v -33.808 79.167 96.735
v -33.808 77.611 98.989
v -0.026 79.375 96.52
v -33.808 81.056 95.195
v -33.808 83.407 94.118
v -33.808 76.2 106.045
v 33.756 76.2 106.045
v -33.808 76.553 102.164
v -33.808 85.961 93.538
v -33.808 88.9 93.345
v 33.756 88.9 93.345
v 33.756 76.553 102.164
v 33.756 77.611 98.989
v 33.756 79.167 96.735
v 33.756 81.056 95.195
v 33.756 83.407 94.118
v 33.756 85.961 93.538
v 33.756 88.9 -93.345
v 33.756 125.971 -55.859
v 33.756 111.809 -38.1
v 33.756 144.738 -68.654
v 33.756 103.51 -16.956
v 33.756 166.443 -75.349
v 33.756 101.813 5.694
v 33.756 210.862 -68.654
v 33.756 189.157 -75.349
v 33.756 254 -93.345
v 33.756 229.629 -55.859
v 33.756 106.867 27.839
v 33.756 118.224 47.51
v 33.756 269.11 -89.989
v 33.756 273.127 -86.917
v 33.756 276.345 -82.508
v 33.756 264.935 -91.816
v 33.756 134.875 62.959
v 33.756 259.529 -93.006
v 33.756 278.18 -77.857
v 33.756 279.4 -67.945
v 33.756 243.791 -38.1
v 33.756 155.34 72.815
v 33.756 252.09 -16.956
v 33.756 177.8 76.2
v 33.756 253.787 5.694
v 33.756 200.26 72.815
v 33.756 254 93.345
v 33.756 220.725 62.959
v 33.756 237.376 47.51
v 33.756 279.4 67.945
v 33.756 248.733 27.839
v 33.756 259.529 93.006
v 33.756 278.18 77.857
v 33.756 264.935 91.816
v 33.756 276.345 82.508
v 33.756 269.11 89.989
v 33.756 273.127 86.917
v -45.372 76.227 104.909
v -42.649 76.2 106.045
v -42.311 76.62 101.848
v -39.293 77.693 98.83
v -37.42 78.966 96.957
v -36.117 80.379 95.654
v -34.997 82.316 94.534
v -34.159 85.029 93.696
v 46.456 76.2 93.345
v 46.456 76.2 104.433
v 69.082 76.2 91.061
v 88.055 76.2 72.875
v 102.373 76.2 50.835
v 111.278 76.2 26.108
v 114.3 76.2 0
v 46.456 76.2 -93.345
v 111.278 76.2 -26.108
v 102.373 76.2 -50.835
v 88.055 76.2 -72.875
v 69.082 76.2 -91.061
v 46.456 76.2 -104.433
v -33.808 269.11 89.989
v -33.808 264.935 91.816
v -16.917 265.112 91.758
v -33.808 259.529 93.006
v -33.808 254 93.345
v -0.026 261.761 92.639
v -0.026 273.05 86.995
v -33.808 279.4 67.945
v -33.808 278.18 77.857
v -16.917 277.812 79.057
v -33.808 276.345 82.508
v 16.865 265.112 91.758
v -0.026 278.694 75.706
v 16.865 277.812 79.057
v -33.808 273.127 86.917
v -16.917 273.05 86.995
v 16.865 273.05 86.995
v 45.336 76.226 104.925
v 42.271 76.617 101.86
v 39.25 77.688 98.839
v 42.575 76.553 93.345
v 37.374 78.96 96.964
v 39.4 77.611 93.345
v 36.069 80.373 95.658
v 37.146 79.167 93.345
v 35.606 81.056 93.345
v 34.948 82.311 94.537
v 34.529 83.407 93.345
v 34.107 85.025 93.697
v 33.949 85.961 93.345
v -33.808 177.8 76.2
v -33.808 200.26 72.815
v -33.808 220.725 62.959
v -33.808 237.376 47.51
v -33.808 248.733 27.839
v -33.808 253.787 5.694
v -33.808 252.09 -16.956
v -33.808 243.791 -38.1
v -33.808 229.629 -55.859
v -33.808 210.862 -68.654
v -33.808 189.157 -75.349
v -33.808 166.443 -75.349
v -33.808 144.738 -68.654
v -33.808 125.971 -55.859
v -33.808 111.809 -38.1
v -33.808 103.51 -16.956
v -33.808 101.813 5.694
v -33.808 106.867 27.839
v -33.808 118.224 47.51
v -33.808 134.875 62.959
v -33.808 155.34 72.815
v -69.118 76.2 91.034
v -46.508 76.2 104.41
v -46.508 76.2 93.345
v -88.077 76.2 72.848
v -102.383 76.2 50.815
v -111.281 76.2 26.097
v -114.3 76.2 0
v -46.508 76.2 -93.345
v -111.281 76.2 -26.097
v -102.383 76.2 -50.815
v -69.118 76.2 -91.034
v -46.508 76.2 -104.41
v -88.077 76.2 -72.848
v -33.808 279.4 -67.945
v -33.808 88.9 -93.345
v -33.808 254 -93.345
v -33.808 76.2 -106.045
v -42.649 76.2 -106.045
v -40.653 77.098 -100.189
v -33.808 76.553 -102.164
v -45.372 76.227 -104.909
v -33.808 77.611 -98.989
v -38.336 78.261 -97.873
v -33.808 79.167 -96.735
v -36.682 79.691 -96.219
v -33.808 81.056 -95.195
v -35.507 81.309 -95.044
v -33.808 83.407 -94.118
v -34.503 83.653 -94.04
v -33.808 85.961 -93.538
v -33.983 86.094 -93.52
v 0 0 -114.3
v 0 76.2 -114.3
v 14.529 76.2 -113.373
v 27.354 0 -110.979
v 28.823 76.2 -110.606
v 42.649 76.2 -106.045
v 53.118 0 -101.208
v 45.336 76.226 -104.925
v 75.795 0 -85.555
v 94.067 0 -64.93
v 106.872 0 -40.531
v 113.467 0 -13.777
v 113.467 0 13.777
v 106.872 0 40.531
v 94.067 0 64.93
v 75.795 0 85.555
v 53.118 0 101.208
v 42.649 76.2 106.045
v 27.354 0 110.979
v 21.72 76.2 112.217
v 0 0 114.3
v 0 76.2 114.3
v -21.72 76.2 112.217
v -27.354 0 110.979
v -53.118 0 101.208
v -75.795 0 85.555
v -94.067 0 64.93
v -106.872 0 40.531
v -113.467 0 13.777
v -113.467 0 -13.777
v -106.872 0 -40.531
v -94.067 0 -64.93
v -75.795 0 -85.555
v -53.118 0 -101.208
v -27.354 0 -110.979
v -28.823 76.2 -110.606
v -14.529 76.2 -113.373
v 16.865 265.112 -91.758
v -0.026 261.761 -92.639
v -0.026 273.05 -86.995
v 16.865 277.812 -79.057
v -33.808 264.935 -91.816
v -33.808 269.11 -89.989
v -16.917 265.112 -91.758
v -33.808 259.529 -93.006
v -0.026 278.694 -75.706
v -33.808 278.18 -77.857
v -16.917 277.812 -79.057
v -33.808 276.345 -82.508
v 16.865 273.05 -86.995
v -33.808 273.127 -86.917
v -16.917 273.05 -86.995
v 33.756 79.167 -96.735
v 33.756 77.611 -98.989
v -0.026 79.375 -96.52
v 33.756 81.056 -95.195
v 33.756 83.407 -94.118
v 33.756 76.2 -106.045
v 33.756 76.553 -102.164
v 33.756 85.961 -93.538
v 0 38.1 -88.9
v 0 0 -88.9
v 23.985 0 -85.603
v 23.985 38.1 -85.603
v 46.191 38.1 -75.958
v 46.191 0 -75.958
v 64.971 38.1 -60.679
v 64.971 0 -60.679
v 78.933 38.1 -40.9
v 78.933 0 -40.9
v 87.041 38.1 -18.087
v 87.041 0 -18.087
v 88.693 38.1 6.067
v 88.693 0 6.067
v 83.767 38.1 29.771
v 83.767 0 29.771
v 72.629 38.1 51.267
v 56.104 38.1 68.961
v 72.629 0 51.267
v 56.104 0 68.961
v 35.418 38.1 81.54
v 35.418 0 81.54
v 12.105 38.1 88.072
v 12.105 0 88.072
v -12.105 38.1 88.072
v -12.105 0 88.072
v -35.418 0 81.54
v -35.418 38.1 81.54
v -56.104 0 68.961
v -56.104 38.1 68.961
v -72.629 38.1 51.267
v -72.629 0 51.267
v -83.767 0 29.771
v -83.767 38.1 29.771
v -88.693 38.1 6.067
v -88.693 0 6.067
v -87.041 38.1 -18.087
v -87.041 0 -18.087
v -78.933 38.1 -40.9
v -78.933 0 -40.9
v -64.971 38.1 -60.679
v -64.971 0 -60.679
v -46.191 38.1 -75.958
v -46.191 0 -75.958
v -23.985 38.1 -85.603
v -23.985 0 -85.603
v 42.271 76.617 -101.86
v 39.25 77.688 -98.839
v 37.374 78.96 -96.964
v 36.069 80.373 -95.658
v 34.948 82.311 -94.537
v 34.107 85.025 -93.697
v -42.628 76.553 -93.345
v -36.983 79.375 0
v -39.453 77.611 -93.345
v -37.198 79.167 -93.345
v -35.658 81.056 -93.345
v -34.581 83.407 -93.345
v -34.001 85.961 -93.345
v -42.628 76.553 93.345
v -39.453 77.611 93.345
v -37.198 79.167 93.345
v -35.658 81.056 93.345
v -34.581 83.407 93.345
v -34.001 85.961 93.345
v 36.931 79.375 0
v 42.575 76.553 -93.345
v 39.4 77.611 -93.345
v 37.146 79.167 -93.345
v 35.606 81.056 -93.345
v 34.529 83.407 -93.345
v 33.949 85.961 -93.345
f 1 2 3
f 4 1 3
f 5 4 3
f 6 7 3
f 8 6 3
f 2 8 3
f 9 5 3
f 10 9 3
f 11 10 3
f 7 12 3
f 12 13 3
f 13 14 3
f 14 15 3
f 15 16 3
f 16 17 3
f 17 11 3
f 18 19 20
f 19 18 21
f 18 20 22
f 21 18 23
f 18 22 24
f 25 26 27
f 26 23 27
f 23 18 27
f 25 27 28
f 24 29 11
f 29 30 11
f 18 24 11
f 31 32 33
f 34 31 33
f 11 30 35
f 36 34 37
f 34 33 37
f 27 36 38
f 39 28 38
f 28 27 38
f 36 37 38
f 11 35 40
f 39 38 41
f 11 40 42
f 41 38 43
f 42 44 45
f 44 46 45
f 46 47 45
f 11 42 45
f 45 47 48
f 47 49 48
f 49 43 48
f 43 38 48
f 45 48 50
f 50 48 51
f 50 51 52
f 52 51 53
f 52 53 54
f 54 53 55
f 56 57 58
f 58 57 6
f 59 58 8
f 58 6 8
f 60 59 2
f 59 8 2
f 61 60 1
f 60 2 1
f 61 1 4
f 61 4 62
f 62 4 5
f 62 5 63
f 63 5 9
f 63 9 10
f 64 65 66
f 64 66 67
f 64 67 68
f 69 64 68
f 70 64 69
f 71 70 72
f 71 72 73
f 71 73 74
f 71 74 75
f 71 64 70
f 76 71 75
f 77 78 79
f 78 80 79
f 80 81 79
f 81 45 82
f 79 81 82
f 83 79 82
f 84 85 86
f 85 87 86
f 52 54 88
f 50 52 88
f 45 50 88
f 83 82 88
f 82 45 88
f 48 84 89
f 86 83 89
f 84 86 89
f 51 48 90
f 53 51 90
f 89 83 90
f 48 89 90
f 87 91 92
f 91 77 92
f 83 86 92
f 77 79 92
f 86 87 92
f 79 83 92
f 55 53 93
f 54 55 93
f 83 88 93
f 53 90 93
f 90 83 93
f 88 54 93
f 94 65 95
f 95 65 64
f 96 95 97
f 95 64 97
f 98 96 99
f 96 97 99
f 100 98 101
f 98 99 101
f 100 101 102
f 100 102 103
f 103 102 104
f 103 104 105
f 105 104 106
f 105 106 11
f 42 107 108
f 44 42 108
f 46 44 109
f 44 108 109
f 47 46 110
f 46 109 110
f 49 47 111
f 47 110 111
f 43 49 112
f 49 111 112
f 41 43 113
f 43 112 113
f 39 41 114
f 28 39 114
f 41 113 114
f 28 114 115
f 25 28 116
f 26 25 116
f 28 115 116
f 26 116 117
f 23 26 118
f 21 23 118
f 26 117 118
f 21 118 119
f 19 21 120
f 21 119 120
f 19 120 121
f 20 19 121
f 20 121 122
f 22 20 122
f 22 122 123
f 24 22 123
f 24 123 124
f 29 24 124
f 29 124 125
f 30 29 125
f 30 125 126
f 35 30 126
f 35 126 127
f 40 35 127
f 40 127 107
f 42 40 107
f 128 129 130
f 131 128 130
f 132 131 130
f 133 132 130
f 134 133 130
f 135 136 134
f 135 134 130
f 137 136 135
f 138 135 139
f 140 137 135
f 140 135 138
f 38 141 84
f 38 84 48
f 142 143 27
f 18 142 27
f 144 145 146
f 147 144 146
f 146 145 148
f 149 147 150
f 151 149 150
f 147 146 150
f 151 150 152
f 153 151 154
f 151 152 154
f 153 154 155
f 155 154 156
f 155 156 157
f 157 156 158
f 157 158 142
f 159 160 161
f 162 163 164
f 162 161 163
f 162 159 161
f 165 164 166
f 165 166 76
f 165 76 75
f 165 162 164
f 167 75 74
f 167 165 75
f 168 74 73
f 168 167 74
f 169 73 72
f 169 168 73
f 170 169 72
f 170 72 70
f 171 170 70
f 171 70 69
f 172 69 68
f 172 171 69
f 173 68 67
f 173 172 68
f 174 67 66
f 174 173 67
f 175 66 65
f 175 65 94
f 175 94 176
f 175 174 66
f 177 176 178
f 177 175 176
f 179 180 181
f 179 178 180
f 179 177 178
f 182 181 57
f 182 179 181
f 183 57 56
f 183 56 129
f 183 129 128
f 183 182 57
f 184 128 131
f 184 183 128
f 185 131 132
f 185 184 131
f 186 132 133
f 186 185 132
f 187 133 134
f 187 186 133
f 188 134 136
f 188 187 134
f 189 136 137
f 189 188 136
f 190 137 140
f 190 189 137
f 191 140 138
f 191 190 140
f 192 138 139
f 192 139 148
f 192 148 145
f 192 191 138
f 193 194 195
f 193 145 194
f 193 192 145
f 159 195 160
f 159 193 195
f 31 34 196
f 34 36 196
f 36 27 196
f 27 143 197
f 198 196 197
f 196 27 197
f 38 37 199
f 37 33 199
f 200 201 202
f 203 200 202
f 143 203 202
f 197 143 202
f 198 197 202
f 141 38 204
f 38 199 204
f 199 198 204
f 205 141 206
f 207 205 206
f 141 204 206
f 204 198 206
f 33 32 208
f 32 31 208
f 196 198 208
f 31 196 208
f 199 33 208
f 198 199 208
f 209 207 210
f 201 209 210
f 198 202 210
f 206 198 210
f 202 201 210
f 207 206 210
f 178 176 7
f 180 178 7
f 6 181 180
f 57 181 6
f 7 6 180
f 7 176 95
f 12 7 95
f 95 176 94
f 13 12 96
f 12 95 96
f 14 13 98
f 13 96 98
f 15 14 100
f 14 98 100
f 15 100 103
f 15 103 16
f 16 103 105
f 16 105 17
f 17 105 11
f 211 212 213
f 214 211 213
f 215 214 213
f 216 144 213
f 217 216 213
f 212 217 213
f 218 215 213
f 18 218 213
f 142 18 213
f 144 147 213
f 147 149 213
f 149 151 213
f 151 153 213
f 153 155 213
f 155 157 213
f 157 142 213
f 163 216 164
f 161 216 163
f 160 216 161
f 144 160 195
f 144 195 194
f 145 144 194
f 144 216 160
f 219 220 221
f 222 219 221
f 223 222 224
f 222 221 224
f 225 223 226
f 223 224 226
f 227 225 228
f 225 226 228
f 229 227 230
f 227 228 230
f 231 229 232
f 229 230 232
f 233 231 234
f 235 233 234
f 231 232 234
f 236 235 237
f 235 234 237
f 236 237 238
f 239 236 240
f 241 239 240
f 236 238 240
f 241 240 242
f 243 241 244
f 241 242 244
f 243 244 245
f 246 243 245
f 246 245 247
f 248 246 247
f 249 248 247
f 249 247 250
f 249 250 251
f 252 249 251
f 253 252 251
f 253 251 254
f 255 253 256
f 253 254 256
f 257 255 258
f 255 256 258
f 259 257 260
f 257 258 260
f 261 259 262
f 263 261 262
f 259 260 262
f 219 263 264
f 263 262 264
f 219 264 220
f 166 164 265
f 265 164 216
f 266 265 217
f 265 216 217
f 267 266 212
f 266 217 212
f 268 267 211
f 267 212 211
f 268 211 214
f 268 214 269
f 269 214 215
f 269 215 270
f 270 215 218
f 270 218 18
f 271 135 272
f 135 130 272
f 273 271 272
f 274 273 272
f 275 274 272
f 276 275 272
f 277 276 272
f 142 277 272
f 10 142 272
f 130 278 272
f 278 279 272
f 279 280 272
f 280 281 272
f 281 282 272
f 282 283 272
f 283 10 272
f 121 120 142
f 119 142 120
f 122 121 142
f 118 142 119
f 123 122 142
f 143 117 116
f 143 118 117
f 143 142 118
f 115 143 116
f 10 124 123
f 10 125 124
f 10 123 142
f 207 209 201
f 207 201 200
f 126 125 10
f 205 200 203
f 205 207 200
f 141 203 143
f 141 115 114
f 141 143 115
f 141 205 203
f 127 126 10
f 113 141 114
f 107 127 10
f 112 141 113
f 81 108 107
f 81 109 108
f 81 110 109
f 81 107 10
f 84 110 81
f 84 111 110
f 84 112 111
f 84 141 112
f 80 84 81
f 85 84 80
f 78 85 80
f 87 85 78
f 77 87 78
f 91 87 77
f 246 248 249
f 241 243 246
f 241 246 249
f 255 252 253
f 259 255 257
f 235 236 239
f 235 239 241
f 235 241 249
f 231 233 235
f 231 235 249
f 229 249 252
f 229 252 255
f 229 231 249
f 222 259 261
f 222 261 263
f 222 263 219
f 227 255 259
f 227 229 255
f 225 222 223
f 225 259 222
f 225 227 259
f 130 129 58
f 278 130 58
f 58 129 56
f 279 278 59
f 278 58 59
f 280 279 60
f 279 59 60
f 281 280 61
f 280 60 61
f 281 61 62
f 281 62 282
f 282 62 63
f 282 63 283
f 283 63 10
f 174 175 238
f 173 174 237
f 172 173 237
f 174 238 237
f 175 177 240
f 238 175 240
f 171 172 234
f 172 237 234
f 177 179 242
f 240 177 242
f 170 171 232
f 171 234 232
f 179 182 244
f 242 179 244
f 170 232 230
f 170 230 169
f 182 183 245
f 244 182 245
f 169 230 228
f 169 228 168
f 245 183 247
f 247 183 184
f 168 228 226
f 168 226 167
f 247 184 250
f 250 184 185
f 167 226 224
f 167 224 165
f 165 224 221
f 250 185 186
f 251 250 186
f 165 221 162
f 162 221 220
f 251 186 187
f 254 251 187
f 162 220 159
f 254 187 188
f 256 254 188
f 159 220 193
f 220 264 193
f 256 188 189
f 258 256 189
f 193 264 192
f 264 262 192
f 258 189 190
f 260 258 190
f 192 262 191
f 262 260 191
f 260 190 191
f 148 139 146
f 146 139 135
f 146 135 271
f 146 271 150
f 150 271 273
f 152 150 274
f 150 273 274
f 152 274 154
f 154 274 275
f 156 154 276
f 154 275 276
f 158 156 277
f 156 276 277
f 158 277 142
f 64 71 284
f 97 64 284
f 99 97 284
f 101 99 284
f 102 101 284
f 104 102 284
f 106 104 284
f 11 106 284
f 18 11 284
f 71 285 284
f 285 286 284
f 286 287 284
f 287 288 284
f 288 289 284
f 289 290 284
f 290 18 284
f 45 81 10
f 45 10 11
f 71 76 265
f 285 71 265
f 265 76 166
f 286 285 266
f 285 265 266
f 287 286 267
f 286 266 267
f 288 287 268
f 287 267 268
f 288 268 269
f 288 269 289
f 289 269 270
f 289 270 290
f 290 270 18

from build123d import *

# Parameters (mm, degrees)
SKETCH1_R           = 114.3
BOSS_EXTRUDE1_DEPTH = 76.2
SKETCH3_W           = 67.564
SKETCH3_H           = 186.69
BOSS_EXTRUDE3_DEPTH = 203.2
SKETCH4_R           = 76.2
CUT_EXTRUDE1_DEPTH  = 127
FILLET1_SIZE        = 25.4
FILLET2_SIZE        = 12.7
SKETCH2_R           = 88.9
CUT_EXTRUDE2_DEPTH  = 38.1


with BuildPart() as part:
    # Sketch1 → Boss-Extrude1 (new body)
    with BuildSketch(Plane(origin=(0, 0, 0), x_dir=(1, 0, 0), z_dir=(0, 1, 0))):
        with Locations(Location((0, 0, 0), (0, 0, 90))):
            Circle(SKETCH1_R)
    extrude(amount=BOSS_EXTRUDE1_DEPTH)

    # Sketch3 → Boss-Extrude3 (add)
    with BuildSketch(Plane(origin=(0, 76.2, 0), x_dir=(1, 0, 0), z_dir=(0, 1, 0))):
        with Locations((-0.02614759, 0)):
            Rectangle(SKETCH3_W, SKETCH3_H)
    extrude(amount=BOSS_EXTRUDE3_DEPTH)

    # Sketch4 → Cut-Extrude1 (cut)
    with BuildSketch(Plane.ZY.offset(33.80814759)):
        with Locations((0, 177.8)):
            Circle(SKETCH4_R)
    extrude(amount=-CUT_EXTRUDE1_DEPTH, mode=Mode.SUBTRACT)

    # Fillet1
    # a fillet whose section is not a circle: 25.4 mm, written as the material it takes off along each edge
    with BuildSketch(Plane(origin=(97.25585241, 279.4, 93.345), x_dir=(0, -1, 0), z_dir=(-1, 0, 0)), Plane(origin=(-97.30814759, 279.4, -93.345), x_dir=(0, -1, 0), z_dir=(1, 0, 0))) as fillet1_piece_1:
        with BuildLine():
            Bezier((FILLET1_SIZE, 0), (0, 0), (0, -FILLET1_SIZE), weights=[1, 1, 1])
            Line((0, -FILLET1_SIZE), (0, 0))
            Line((0, 0), (FILLET1_SIZE, 0))
        make_face()
    extrude(amount=194.564, mode=Mode.SUBTRACT)

    # Fillet2
    # a fillet whose section is not a circle: 12.7 mm, written as the material it adds along each edge
    with BuildSketch(Plane(origin=(33.75585241, 76.2, 93.345), x_dir=(0, 0, 1), z_dir=(-1, 0, 0)), Plane(origin=(-33.80814759, 76.2, -93.345), x_dir=(0, 0, -1), z_dir=(1, 0, 0))) as fillet2_piece_1:
        with BuildLine():
            Bezier((FILLET2_SIZE, 0), (0, 0), (0, FILLET2_SIZE), weights=[1, 1, 1])
            Line((0, FILLET2_SIZE), (0, 0))
            Line((0, 0), (FILLET2_SIZE, 0))
        make_face()
    extrude(amount=67.564)
    with BuildSketch(Plane(origin=(-33.80814759, 76.2, 93.345), x_dir=(-1, 0, 0), z_dir=(0, 0, -1)), Plane(origin=(33.75585241, 76.2, -93.345), x_dir=(1, 0, 0), z_dir=(0, 0, 1))) as fillet2_piece_2:
        with BuildLine():
            Bezier((FILLET2_SIZE, 0), (0, 0), (0, FILLET2_SIZE), weights=[1, 1, 1])
            Line((0, FILLET2_SIZE), (0, 0))
            Line((0, 0), (FILLET2_SIZE, 0))
        make_face()
    extrude(amount=186.69)
    with BuildSketch(Plane(origin=(65.50585241, 76.2, 93.345), x_dir=(0, 0, 1), z_dir=(-1, 0, 0))) as fillet2_piece_3a_section:
        with BuildLine():
            Bezier((FILLET2_SIZE, 0), (0, 0), (0, FILLET2_SIZE), weights=[1, 1, 1])
            Line((0, FILLET2_SIZE), (0, 0))
            Line((0, 0), (FILLET2_SIZE, 0))
        make_face()
    fillet2_piece_3a = extrude(amount=99.314, mode=Mode.PRIVATE)
    fillet2_piece_3a = fillet2_piece_3a & Plane(origin=(0, 76.2, 0), x_dir=(0, 0, -1), z_dir=(0, -1, 0)) * Cylinder(114.3, 250, mode=Mode.PRIVATE)
    fillet2_piece_3a = split(fillet2_piece_3a, bisect_by=Plane(origin=(33.75585241, 76.2, 93.345), z_dir=(1, 0, 0)), keep=Keep.TOP, mode=Mode.PRIVATE)
    with BuildSketch(Plane(origin=(33.75585241, 76.2, -93.345), x_dir=(1, 0, 0), z_dir=(0, 0, 1))) as fillet2_piece_3b_section:
        with BuildLine():
            Bezier((FILLET2_SIZE, 0), (0, 0), (0, FILLET2_SIZE), weights=[1, 1, 1])
            Line((0, FILLET2_SIZE), (0, 0))
            Line((0, 0), (FILLET2_SIZE, 0))
        make_face()
    fillet2_piece_3b = extrude(amount=218.44, mode=Mode.PRIVATE)
    fillet2_piece_3b = fillet2_piece_3b & Plane(origin=(0, 76.2, 0), x_dir=(0, 0, -1), z_dir=(0, -1, 0)) * Cylinder(114.3, 488, mode=Mode.PRIVATE)
    fillet2_piece_3b = split(fillet2_piece_3b, bisect_by=Plane(origin=(33.75585241, 76.2, 93.345), z_dir=(0, 0, 1)), keep=Keep.TOP, mode=Mode.PRIVATE)
    fillet2_piece_3 = fillet2_piece_3a & fillet2_piece_3b
    add(fillet2_piece_3)
    with BuildSketch(Plane(origin=(-33.80814759, 76.2, 125.095), x_dir=(-1, 0, 0), z_dir=(0, 0, -1))) as fillet2_piece_4a_section:
        with BuildLine():
            Bezier((FILLET2_SIZE, 0), (0, 0), (0, FILLET2_SIZE), weights=[1, 1, 1])
            Line((0, FILLET2_SIZE), (0, 0))
            Line((0, 0), (FILLET2_SIZE, 0))
        make_face()
    fillet2_piece_4a = extrude(amount=218.44, mode=Mode.PRIVATE)
    fillet2_piece_4a = fillet2_piece_4a & Plane(origin=(0, 76.2, 0), x_dir=(0, 0, -1), z_dir=(0, -1, 0)) * Cylinder(114.3, 488, mode=Mode.PRIVATE)
    fillet2_piece_4a = split(fillet2_piece_4a, bisect_by=Plane(origin=(-33.80814759, 76.2, 93.345), z_dir=(0, 0, 1)), keep=Keep.TOP, mode=Mode.PRIVATE)
    with BuildSketch(Plane(origin=(33.75585241, 76.2, 93.345), x_dir=(0, 0, 1), z_dir=(-1, 0, 0))) as fillet2_piece_4b_section:
        with BuildLine():
            Bezier((FILLET2_SIZE, 0), (0, 0), (0, FILLET2_SIZE), weights=[1, 1, 1])
            Line((0, FILLET2_SIZE), (0, 0))
            Line((0, 0), (FILLET2_SIZE, 0))
        make_face()
    fillet2_piece_4b = extrude(amount=99.314, mode=Mode.PRIVATE)
    fillet2_piece_4b = fillet2_piece_4b & Plane(origin=(0, 76.2, 0), x_dir=(0, 0, -1), z_dir=(0, -1, 0)) * Cylinder(114.3, 250, mode=Mode.PRIVATE)
    fillet2_piece_4b = split(fillet2_piece_4b, bisect_by=Plane(origin=(-33.80814759, 76.2, 93.345), z_dir=(-1, 0, 0)), keep=Keep.TOP, mode=Mode.PRIVATE)
    fillet2_piece_4 = fillet2_piece_4a & fillet2_piece_4b
    add(fillet2_piece_4)
    with BuildSketch(Plane(origin=(-33.80814759, 76.2, 93.345), x_dir=(-1, 0, 0), z_dir=(0, 0, -1))) as fillet2_piece_5a_section:
        with BuildLine():
            Bezier((FILLET2_SIZE, 0), (0, 0), (0, FILLET2_SIZE), weights=[1, 1, 1])
            Line((0, FILLET2_SIZE), (0, 0))
            Line((0, 0), (FILLET2_SIZE, 0))
        make_face()
    fillet2_piece_5a = extrude(amount=218.44, mode=Mode.PRIVATE)
    fillet2_piece_5a = fillet2_piece_5a & Plane(origin=(0, 76.2, 0), x_dir=(0, 0, -1), z_dir=(0, -1, 0)) * Cylinder(114.3, 488, mode=Mode.PRIVATE)
    fillet2_piece_5a = split(fillet2_piece_5a, bisect_by=Plane(origin=(-33.80814759, 76.2, -93.345), z_dir=(0, 0, -1)), keep=Keep.TOP, mode=Mode.PRIVATE)
    with BuildSketch(Plane(origin=(-65.55814759, 76.2, -93.345), x_dir=(0, 0, -1), z_dir=(1, 0, 0))) as fillet2_piece_5b_section:
        with BuildLine():
            Bezier((FILLET2_SIZE, 0), (0, 0), (0, FILLET2_SIZE), weights=[1, 1, 1])
            Line((0, FILLET2_SIZE), (0, 0))
            Line((0, 0), (FILLET2_SIZE, 0))
        make_face()
    fillet2_piece_5b = extrude(amount=99.314, mode=Mode.PRIVATE)
    fillet2_piece_5b = fillet2_piece_5b & Plane(origin=(0, 76.2, 0), x_dir=(0, 0, -1), z_dir=(0, -1, 0)) * Cylinder(114.3, 250, mode=Mode.PRIVATE)
    fillet2_piece_5b = split(fillet2_piece_5b, bisect_by=Plane(origin=(-33.80814759, 76.2, -93.345), z_dir=(-1, 0, 0)), keep=Keep.TOP, mode=Mode.PRIVATE)
    fillet2_piece_5 = fillet2_piece_5a & fillet2_piece_5b
    add(fillet2_piece_5)
    with BuildSketch(Plane(origin=(33.75585241, 76.2, -125.095), x_dir=(1, 0, 0), z_dir=(0, 0, 1))) as fillet2_piece_6a_section:
        with BuildLine():
            Bezier((FILLET2_SIZE, 0), (0, 0), (0, FILLET2_SIZE), weights=[1, 1, 1])
            Line((0, FILLET2_SIZE), (0, 0))
            Line((0, 0), (FILLET2_SIZE, 0))
        make_face()
    fillet2_piece_6a = extrude(amount=218.44, mode=Mode.PRIVATE)
    fillet2_piece_6a = fillet2_piece_6a & Plane(origin=(0, 76.2, 0), x_dir=(0, 0, -1), z_dir=(0, -1, 0)) * Cylinder(114.3, 488, mode=Mode.PRIVATE)
    fillet2_piece_6a = split(fillet2_piece_6a, bisect_by=Plane(origin=(33.75585241, 76.2, -93.345), z_dir=(0, 0, -1)), keep=Keep.TOP, mode=Mode.PRIVATE)
    with BuildSketch(Plane(origin=(-33.80814759, 76.2, -93.345), x_dir=(0, 0, -1), z_dir=(1, 0, 0))) as fillet2_piece_6b_section:
        with BuildLine():
            Bezier((FILLET2_SIZE, 0), (0, 0), (0, FILLET2_SIZE), weights=[1, 1, 1])
            Line((0, FILLET2_SIZE), (0, 0))
            Line((0, 0), (FILLET2_SIZE, 0))
        make_face()
    fillet2_piece_6b = extrude(amount=99.314, mode=Mode.PRIVATE)
    fillet2_piece_6b = fillet2_piece_6b & Plane(origin=(0, 76.2, 0), x_dir=(0, 0, -1), z_dir=(0, -1, 0)) * Cylinder(114.3, 250, mode=Mode.PRIVATE)
    fillet2_piece_6b = split(fillet2_piece_6b, bisect_by=Plane(origin=(33.75585241, 76.2, -93.345), z_dir=(1, 0, 0)), keep=Keep.TOP, mode=Mode.PRIVATE)
    fillet2_piece_6 = fillet2_piece_6a & fillet2_piece_6b
    add(fillet2_piece_6)

    # Sketch2 → Cut-Extrude2 (cut)
    with BuildSketch(Plane(origin=(0, 0, 0), x_dir=(-1, 0, 0), z_dir=(0, -1, 0))):
        with Locations(Location((0, 0, 0), (0, 0, 90))):
            Circle(SKETCH2_R)
    extrude(amount=-CUT_EXTRUDE2_DEPTH, mode=Mode.SUBTRACT)


solid = part.part
